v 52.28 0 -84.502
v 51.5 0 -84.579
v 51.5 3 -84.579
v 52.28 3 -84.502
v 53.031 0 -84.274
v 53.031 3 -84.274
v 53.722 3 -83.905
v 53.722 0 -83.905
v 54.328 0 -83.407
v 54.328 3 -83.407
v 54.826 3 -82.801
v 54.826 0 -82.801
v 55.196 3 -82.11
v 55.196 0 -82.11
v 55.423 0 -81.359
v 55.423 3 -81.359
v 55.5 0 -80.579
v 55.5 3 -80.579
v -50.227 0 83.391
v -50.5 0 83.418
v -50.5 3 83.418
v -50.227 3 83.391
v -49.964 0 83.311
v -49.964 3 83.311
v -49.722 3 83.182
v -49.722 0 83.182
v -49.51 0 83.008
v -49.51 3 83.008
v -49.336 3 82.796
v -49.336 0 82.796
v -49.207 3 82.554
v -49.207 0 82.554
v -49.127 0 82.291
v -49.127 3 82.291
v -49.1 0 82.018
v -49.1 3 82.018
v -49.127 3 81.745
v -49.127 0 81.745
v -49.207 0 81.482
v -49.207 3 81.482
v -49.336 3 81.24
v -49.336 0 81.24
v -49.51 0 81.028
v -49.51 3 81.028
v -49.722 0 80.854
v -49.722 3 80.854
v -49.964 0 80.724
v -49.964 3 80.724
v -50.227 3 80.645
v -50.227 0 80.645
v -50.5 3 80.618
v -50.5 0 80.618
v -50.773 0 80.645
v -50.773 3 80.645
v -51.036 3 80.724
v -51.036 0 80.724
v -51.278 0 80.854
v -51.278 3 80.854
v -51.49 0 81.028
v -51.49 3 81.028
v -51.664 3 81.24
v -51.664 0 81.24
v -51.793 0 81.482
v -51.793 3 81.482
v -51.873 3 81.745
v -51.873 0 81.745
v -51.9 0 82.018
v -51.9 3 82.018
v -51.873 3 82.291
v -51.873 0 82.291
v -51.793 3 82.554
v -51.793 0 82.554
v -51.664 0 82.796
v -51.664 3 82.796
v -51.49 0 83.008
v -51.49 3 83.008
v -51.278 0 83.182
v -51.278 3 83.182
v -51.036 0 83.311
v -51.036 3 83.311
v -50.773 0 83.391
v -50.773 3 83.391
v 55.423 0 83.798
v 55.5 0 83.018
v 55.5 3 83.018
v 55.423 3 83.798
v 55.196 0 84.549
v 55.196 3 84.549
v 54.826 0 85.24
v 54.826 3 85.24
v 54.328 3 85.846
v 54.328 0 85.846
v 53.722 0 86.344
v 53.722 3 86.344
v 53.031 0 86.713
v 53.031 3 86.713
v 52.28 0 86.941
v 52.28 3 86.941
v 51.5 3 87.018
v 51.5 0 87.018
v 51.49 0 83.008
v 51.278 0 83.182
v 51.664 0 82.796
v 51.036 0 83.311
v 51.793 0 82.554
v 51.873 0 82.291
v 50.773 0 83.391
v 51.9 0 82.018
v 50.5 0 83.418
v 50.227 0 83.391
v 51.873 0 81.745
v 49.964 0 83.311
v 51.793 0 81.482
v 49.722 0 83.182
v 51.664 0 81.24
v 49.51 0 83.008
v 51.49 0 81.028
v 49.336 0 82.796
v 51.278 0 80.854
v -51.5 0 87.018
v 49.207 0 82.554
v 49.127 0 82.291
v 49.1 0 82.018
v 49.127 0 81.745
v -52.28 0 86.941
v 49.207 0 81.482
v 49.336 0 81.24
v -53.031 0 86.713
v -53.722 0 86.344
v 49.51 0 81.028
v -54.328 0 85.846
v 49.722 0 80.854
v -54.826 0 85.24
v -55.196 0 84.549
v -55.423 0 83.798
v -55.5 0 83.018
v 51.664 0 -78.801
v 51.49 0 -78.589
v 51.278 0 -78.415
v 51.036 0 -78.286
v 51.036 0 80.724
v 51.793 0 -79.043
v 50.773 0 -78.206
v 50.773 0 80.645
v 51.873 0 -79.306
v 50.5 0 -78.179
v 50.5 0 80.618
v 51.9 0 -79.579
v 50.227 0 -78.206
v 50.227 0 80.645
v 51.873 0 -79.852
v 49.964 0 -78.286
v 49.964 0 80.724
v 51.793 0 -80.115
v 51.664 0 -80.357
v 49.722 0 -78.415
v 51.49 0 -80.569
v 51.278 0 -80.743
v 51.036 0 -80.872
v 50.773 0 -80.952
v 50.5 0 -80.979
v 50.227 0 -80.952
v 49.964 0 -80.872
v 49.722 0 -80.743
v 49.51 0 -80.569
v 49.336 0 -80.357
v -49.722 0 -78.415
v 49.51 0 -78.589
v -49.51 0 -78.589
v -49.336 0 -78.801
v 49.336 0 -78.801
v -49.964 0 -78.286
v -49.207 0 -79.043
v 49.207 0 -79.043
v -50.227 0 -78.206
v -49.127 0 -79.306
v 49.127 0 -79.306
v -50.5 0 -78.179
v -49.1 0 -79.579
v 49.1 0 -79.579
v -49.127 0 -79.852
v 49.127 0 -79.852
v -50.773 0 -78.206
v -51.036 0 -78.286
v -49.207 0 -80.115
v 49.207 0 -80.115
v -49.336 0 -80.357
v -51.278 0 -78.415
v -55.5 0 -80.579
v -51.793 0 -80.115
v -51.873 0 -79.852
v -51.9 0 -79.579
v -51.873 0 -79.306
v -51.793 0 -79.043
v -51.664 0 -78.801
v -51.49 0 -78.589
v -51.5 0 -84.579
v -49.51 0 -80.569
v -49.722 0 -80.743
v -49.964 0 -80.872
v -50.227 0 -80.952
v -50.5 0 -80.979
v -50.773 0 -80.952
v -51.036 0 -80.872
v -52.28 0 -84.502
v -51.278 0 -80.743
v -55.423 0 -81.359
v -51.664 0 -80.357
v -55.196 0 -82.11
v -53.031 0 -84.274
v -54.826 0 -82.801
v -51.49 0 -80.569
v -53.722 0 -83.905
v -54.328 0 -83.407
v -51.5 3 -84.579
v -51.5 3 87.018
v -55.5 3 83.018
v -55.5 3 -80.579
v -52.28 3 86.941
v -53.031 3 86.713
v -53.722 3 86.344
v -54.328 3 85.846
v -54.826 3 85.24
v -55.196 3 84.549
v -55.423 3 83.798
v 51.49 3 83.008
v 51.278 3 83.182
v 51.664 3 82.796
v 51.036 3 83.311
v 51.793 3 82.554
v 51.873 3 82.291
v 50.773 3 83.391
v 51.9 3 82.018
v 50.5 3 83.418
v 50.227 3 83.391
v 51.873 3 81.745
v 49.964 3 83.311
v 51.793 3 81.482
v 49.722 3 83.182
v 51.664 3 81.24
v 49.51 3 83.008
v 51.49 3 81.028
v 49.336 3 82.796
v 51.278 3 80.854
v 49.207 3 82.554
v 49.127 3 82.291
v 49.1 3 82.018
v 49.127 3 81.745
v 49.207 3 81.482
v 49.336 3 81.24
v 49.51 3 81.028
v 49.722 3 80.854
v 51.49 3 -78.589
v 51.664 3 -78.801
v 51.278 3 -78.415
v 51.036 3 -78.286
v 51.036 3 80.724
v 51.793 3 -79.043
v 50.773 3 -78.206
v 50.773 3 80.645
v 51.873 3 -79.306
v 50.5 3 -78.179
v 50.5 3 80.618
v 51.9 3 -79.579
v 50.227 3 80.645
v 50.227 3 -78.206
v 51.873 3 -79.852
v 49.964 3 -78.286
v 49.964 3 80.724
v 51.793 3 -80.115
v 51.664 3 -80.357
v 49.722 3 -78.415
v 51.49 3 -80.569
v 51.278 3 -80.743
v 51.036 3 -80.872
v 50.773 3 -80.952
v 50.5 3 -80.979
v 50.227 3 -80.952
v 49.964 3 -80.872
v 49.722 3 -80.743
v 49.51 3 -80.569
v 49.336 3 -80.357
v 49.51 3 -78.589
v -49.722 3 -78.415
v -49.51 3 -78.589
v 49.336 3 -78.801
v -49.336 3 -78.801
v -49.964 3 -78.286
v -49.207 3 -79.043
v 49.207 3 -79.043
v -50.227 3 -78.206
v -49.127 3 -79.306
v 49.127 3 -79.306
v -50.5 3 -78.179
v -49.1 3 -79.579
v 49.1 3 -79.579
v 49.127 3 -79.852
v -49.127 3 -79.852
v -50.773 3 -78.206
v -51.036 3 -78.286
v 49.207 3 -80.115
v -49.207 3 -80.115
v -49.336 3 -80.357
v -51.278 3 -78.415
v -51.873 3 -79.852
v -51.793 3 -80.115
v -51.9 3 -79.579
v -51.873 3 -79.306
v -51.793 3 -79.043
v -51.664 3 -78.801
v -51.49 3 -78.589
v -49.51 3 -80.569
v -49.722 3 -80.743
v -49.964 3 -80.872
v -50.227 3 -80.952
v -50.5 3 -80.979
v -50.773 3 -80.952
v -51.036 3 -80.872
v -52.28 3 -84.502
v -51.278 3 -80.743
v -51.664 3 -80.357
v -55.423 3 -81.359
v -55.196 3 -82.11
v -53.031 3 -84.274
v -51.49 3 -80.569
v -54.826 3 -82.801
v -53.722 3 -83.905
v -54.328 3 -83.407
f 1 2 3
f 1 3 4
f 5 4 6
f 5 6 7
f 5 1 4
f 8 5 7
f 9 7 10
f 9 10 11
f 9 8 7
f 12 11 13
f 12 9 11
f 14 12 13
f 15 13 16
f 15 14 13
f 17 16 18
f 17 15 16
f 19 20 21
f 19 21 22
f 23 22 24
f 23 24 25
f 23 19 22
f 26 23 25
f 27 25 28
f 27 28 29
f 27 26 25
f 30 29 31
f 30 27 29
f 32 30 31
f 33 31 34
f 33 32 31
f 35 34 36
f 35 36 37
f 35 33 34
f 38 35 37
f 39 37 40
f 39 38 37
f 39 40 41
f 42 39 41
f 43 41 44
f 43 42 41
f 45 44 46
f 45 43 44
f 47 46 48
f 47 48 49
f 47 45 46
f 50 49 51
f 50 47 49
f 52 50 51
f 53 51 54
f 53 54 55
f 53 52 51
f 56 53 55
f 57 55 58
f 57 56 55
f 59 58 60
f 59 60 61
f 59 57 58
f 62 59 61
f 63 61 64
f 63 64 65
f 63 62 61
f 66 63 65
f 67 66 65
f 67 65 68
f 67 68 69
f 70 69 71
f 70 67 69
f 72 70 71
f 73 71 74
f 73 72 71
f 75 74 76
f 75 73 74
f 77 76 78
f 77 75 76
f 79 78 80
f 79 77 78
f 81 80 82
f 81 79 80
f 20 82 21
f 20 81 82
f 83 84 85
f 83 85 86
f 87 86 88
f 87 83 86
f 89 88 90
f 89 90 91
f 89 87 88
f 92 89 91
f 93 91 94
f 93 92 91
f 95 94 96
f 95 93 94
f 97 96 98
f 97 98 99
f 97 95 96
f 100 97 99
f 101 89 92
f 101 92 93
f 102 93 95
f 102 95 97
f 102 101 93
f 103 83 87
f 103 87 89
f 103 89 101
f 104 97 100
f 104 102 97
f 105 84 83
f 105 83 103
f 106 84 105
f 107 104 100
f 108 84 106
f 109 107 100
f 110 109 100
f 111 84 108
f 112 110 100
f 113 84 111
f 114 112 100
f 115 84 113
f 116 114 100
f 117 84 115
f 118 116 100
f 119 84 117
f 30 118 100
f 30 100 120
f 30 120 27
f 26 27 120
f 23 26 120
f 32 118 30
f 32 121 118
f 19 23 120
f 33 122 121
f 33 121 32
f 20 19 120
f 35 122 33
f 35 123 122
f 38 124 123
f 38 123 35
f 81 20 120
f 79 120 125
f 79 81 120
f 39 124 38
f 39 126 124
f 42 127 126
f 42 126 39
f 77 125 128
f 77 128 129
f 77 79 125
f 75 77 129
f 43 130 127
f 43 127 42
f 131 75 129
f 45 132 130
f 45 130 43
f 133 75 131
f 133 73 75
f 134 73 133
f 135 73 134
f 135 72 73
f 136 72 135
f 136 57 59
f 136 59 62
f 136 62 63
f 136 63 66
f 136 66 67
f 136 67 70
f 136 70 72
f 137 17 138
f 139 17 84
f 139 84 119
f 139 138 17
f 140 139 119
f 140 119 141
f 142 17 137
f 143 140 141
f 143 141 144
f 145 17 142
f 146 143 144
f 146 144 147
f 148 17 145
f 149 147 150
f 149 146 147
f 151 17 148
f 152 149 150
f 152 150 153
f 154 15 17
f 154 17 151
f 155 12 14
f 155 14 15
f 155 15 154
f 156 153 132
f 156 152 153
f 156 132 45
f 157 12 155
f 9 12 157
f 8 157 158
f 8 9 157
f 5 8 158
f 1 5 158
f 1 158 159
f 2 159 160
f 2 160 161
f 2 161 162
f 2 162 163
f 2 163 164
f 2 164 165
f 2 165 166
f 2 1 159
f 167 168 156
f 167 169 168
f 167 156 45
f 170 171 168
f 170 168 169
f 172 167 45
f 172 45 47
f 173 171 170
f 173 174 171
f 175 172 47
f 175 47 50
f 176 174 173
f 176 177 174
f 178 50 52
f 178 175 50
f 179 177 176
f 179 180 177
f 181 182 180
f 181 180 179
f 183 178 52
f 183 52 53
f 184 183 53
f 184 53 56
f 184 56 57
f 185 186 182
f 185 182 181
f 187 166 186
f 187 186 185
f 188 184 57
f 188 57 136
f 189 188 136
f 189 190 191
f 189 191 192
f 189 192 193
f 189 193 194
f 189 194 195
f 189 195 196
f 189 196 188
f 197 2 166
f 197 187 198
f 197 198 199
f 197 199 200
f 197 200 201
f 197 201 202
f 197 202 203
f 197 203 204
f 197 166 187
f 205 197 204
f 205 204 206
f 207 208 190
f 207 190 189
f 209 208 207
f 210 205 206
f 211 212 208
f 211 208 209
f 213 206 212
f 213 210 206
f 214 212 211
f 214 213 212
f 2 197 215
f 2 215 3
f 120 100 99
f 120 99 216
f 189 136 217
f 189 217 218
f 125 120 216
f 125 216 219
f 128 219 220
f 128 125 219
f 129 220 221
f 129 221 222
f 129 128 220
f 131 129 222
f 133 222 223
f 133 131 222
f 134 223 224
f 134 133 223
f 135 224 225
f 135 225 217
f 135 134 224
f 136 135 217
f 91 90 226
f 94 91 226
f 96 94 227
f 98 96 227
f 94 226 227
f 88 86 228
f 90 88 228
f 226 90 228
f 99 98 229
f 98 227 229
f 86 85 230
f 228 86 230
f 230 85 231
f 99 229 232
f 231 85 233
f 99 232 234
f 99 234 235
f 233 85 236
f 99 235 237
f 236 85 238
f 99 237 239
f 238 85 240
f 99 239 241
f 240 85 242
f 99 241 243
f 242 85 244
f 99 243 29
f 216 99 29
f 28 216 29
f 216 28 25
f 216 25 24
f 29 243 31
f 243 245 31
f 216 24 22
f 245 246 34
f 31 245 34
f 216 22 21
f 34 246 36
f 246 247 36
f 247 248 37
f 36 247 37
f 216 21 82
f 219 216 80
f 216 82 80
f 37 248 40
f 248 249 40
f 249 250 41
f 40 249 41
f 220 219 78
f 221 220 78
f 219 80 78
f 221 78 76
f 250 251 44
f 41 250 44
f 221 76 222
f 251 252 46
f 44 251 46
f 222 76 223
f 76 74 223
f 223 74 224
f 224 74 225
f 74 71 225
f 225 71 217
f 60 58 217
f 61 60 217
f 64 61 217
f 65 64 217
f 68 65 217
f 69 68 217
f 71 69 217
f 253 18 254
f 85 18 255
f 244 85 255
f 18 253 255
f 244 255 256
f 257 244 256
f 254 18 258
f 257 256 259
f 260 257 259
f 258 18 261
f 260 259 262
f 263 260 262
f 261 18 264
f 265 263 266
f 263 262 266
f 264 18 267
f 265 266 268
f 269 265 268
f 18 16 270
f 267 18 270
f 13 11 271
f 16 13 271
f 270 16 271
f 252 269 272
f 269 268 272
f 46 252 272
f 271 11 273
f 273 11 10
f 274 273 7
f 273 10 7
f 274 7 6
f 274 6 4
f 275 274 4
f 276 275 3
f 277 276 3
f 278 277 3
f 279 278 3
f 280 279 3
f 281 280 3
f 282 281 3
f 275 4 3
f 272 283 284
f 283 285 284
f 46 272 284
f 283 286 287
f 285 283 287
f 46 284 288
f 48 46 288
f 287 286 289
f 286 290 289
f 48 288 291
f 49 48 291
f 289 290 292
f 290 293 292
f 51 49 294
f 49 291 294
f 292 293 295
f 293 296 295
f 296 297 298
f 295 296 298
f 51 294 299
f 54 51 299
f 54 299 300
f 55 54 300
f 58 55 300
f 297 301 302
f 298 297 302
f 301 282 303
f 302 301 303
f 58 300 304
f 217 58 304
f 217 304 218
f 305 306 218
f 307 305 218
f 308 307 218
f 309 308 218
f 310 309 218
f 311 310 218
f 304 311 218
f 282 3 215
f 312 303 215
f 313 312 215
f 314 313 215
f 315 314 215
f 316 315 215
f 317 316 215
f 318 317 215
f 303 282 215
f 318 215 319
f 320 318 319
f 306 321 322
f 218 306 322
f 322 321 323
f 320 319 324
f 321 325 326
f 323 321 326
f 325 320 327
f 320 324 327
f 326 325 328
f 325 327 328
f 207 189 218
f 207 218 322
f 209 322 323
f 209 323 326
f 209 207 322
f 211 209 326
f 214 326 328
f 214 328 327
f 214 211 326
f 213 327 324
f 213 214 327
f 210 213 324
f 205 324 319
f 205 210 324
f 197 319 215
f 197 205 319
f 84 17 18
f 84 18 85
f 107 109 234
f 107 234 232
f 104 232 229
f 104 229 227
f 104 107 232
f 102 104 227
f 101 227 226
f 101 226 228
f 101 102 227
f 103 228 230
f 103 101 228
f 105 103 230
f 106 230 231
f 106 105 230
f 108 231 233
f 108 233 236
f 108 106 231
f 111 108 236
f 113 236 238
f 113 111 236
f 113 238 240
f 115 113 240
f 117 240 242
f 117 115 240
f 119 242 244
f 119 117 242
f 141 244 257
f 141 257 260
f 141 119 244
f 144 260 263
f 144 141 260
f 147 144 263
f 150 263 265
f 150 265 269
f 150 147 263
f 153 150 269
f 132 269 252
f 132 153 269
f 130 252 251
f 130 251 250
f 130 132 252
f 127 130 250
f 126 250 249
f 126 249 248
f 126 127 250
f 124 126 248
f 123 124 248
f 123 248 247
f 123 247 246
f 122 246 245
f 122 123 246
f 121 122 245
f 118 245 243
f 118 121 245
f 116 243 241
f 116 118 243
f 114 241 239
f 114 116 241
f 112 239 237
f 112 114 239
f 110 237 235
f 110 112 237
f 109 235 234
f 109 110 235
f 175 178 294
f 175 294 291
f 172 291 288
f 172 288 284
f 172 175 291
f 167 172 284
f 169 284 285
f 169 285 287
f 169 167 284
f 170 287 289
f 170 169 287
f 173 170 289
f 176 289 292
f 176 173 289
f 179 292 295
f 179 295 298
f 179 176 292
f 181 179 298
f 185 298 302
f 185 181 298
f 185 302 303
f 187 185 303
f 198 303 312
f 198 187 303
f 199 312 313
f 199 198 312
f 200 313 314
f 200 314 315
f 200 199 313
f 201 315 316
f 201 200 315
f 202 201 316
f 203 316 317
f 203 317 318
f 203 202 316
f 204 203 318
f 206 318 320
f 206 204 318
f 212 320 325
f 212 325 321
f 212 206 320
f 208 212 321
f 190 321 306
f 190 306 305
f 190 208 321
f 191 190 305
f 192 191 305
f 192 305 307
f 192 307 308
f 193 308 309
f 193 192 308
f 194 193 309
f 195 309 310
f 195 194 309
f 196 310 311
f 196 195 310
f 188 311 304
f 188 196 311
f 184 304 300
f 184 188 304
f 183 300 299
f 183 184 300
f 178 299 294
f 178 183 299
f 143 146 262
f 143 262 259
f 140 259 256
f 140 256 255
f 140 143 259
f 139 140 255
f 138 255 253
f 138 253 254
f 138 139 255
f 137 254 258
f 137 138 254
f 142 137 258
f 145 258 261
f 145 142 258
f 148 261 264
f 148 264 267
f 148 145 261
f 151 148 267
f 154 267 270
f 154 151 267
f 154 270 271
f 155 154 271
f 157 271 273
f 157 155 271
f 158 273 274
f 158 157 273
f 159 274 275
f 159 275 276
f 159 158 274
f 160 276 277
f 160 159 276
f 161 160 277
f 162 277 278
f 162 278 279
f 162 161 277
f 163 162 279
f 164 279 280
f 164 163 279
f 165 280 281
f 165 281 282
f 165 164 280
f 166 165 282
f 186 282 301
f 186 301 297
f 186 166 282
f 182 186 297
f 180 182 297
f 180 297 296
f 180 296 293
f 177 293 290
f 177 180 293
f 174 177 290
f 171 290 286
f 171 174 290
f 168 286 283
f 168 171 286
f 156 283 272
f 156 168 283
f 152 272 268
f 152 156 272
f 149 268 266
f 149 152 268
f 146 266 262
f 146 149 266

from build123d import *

# Parameters (mm, degrees)
SKETCH1_R           = 1.4
BOSS_EXTRUDE1_DEPTH = 3


with BuildPart() as part:
    # Sketch1 → Boss-Extrude1 (new body)
    with BuildSketch(Plane(origin=(0, 0, 0), x_dir=(1, 0, 0), z_dir=(0, 1, 0))):
        with BuildLine():
            ThreePointArc((-55.5, 80.578962649), (-54.328427125, 83.407389773), (-51.5, 84.578962649))
            Line((-51.5, 84.578962649), (51.5, 84.578962649))
            ThreePointArc((51.5, 84.578962649), (54.328427125, 83.407389773), (55.5, 80.578962649))
            Line((55.5, 80.578962649), (55.5, -83.017769116))
            ThreePointArc((55.5, -83.017769116), (54.328427125, -85.846196241), (51.5, -87.017769116))
            Line((51.5, -87.017769116), (-51.5, -87.017769116))
            ThreePointArc((-51.5, -87.017769116), (-54.328427125, -85.846196241), (-55.5, -83.017769116))
            Line((-55.5, -83.017769116), (-55.5, 80.578962649))
        make_face()
        with Locations(Location((-50.5, 79.578962649, 0), (0, 0, 270))):
            Circle(SKETCH1_R, mode=Mode.SUBTRACT)
        with Locations(Location((50.5, 79.578962649, 0), (0, 0, 270))):
            Circle(SKETCH1_R, mode=Mode.SUBTRACT)
        with Locations(Location((50.5, -82.017769116, 0), (0, 0, 270))):
            Circle(SKETCH1_R, mode=Mode.SUBTRACT)
        with Locations(Location((-50.5, -82.017769116, 0), (0, 0, 270))):
            Circle(SKETCH1_R, mode=Mode.SUBTRACT)
    extrude(amount=BOSS_EXTRUDE1_DEPTH)


solid = part.part
